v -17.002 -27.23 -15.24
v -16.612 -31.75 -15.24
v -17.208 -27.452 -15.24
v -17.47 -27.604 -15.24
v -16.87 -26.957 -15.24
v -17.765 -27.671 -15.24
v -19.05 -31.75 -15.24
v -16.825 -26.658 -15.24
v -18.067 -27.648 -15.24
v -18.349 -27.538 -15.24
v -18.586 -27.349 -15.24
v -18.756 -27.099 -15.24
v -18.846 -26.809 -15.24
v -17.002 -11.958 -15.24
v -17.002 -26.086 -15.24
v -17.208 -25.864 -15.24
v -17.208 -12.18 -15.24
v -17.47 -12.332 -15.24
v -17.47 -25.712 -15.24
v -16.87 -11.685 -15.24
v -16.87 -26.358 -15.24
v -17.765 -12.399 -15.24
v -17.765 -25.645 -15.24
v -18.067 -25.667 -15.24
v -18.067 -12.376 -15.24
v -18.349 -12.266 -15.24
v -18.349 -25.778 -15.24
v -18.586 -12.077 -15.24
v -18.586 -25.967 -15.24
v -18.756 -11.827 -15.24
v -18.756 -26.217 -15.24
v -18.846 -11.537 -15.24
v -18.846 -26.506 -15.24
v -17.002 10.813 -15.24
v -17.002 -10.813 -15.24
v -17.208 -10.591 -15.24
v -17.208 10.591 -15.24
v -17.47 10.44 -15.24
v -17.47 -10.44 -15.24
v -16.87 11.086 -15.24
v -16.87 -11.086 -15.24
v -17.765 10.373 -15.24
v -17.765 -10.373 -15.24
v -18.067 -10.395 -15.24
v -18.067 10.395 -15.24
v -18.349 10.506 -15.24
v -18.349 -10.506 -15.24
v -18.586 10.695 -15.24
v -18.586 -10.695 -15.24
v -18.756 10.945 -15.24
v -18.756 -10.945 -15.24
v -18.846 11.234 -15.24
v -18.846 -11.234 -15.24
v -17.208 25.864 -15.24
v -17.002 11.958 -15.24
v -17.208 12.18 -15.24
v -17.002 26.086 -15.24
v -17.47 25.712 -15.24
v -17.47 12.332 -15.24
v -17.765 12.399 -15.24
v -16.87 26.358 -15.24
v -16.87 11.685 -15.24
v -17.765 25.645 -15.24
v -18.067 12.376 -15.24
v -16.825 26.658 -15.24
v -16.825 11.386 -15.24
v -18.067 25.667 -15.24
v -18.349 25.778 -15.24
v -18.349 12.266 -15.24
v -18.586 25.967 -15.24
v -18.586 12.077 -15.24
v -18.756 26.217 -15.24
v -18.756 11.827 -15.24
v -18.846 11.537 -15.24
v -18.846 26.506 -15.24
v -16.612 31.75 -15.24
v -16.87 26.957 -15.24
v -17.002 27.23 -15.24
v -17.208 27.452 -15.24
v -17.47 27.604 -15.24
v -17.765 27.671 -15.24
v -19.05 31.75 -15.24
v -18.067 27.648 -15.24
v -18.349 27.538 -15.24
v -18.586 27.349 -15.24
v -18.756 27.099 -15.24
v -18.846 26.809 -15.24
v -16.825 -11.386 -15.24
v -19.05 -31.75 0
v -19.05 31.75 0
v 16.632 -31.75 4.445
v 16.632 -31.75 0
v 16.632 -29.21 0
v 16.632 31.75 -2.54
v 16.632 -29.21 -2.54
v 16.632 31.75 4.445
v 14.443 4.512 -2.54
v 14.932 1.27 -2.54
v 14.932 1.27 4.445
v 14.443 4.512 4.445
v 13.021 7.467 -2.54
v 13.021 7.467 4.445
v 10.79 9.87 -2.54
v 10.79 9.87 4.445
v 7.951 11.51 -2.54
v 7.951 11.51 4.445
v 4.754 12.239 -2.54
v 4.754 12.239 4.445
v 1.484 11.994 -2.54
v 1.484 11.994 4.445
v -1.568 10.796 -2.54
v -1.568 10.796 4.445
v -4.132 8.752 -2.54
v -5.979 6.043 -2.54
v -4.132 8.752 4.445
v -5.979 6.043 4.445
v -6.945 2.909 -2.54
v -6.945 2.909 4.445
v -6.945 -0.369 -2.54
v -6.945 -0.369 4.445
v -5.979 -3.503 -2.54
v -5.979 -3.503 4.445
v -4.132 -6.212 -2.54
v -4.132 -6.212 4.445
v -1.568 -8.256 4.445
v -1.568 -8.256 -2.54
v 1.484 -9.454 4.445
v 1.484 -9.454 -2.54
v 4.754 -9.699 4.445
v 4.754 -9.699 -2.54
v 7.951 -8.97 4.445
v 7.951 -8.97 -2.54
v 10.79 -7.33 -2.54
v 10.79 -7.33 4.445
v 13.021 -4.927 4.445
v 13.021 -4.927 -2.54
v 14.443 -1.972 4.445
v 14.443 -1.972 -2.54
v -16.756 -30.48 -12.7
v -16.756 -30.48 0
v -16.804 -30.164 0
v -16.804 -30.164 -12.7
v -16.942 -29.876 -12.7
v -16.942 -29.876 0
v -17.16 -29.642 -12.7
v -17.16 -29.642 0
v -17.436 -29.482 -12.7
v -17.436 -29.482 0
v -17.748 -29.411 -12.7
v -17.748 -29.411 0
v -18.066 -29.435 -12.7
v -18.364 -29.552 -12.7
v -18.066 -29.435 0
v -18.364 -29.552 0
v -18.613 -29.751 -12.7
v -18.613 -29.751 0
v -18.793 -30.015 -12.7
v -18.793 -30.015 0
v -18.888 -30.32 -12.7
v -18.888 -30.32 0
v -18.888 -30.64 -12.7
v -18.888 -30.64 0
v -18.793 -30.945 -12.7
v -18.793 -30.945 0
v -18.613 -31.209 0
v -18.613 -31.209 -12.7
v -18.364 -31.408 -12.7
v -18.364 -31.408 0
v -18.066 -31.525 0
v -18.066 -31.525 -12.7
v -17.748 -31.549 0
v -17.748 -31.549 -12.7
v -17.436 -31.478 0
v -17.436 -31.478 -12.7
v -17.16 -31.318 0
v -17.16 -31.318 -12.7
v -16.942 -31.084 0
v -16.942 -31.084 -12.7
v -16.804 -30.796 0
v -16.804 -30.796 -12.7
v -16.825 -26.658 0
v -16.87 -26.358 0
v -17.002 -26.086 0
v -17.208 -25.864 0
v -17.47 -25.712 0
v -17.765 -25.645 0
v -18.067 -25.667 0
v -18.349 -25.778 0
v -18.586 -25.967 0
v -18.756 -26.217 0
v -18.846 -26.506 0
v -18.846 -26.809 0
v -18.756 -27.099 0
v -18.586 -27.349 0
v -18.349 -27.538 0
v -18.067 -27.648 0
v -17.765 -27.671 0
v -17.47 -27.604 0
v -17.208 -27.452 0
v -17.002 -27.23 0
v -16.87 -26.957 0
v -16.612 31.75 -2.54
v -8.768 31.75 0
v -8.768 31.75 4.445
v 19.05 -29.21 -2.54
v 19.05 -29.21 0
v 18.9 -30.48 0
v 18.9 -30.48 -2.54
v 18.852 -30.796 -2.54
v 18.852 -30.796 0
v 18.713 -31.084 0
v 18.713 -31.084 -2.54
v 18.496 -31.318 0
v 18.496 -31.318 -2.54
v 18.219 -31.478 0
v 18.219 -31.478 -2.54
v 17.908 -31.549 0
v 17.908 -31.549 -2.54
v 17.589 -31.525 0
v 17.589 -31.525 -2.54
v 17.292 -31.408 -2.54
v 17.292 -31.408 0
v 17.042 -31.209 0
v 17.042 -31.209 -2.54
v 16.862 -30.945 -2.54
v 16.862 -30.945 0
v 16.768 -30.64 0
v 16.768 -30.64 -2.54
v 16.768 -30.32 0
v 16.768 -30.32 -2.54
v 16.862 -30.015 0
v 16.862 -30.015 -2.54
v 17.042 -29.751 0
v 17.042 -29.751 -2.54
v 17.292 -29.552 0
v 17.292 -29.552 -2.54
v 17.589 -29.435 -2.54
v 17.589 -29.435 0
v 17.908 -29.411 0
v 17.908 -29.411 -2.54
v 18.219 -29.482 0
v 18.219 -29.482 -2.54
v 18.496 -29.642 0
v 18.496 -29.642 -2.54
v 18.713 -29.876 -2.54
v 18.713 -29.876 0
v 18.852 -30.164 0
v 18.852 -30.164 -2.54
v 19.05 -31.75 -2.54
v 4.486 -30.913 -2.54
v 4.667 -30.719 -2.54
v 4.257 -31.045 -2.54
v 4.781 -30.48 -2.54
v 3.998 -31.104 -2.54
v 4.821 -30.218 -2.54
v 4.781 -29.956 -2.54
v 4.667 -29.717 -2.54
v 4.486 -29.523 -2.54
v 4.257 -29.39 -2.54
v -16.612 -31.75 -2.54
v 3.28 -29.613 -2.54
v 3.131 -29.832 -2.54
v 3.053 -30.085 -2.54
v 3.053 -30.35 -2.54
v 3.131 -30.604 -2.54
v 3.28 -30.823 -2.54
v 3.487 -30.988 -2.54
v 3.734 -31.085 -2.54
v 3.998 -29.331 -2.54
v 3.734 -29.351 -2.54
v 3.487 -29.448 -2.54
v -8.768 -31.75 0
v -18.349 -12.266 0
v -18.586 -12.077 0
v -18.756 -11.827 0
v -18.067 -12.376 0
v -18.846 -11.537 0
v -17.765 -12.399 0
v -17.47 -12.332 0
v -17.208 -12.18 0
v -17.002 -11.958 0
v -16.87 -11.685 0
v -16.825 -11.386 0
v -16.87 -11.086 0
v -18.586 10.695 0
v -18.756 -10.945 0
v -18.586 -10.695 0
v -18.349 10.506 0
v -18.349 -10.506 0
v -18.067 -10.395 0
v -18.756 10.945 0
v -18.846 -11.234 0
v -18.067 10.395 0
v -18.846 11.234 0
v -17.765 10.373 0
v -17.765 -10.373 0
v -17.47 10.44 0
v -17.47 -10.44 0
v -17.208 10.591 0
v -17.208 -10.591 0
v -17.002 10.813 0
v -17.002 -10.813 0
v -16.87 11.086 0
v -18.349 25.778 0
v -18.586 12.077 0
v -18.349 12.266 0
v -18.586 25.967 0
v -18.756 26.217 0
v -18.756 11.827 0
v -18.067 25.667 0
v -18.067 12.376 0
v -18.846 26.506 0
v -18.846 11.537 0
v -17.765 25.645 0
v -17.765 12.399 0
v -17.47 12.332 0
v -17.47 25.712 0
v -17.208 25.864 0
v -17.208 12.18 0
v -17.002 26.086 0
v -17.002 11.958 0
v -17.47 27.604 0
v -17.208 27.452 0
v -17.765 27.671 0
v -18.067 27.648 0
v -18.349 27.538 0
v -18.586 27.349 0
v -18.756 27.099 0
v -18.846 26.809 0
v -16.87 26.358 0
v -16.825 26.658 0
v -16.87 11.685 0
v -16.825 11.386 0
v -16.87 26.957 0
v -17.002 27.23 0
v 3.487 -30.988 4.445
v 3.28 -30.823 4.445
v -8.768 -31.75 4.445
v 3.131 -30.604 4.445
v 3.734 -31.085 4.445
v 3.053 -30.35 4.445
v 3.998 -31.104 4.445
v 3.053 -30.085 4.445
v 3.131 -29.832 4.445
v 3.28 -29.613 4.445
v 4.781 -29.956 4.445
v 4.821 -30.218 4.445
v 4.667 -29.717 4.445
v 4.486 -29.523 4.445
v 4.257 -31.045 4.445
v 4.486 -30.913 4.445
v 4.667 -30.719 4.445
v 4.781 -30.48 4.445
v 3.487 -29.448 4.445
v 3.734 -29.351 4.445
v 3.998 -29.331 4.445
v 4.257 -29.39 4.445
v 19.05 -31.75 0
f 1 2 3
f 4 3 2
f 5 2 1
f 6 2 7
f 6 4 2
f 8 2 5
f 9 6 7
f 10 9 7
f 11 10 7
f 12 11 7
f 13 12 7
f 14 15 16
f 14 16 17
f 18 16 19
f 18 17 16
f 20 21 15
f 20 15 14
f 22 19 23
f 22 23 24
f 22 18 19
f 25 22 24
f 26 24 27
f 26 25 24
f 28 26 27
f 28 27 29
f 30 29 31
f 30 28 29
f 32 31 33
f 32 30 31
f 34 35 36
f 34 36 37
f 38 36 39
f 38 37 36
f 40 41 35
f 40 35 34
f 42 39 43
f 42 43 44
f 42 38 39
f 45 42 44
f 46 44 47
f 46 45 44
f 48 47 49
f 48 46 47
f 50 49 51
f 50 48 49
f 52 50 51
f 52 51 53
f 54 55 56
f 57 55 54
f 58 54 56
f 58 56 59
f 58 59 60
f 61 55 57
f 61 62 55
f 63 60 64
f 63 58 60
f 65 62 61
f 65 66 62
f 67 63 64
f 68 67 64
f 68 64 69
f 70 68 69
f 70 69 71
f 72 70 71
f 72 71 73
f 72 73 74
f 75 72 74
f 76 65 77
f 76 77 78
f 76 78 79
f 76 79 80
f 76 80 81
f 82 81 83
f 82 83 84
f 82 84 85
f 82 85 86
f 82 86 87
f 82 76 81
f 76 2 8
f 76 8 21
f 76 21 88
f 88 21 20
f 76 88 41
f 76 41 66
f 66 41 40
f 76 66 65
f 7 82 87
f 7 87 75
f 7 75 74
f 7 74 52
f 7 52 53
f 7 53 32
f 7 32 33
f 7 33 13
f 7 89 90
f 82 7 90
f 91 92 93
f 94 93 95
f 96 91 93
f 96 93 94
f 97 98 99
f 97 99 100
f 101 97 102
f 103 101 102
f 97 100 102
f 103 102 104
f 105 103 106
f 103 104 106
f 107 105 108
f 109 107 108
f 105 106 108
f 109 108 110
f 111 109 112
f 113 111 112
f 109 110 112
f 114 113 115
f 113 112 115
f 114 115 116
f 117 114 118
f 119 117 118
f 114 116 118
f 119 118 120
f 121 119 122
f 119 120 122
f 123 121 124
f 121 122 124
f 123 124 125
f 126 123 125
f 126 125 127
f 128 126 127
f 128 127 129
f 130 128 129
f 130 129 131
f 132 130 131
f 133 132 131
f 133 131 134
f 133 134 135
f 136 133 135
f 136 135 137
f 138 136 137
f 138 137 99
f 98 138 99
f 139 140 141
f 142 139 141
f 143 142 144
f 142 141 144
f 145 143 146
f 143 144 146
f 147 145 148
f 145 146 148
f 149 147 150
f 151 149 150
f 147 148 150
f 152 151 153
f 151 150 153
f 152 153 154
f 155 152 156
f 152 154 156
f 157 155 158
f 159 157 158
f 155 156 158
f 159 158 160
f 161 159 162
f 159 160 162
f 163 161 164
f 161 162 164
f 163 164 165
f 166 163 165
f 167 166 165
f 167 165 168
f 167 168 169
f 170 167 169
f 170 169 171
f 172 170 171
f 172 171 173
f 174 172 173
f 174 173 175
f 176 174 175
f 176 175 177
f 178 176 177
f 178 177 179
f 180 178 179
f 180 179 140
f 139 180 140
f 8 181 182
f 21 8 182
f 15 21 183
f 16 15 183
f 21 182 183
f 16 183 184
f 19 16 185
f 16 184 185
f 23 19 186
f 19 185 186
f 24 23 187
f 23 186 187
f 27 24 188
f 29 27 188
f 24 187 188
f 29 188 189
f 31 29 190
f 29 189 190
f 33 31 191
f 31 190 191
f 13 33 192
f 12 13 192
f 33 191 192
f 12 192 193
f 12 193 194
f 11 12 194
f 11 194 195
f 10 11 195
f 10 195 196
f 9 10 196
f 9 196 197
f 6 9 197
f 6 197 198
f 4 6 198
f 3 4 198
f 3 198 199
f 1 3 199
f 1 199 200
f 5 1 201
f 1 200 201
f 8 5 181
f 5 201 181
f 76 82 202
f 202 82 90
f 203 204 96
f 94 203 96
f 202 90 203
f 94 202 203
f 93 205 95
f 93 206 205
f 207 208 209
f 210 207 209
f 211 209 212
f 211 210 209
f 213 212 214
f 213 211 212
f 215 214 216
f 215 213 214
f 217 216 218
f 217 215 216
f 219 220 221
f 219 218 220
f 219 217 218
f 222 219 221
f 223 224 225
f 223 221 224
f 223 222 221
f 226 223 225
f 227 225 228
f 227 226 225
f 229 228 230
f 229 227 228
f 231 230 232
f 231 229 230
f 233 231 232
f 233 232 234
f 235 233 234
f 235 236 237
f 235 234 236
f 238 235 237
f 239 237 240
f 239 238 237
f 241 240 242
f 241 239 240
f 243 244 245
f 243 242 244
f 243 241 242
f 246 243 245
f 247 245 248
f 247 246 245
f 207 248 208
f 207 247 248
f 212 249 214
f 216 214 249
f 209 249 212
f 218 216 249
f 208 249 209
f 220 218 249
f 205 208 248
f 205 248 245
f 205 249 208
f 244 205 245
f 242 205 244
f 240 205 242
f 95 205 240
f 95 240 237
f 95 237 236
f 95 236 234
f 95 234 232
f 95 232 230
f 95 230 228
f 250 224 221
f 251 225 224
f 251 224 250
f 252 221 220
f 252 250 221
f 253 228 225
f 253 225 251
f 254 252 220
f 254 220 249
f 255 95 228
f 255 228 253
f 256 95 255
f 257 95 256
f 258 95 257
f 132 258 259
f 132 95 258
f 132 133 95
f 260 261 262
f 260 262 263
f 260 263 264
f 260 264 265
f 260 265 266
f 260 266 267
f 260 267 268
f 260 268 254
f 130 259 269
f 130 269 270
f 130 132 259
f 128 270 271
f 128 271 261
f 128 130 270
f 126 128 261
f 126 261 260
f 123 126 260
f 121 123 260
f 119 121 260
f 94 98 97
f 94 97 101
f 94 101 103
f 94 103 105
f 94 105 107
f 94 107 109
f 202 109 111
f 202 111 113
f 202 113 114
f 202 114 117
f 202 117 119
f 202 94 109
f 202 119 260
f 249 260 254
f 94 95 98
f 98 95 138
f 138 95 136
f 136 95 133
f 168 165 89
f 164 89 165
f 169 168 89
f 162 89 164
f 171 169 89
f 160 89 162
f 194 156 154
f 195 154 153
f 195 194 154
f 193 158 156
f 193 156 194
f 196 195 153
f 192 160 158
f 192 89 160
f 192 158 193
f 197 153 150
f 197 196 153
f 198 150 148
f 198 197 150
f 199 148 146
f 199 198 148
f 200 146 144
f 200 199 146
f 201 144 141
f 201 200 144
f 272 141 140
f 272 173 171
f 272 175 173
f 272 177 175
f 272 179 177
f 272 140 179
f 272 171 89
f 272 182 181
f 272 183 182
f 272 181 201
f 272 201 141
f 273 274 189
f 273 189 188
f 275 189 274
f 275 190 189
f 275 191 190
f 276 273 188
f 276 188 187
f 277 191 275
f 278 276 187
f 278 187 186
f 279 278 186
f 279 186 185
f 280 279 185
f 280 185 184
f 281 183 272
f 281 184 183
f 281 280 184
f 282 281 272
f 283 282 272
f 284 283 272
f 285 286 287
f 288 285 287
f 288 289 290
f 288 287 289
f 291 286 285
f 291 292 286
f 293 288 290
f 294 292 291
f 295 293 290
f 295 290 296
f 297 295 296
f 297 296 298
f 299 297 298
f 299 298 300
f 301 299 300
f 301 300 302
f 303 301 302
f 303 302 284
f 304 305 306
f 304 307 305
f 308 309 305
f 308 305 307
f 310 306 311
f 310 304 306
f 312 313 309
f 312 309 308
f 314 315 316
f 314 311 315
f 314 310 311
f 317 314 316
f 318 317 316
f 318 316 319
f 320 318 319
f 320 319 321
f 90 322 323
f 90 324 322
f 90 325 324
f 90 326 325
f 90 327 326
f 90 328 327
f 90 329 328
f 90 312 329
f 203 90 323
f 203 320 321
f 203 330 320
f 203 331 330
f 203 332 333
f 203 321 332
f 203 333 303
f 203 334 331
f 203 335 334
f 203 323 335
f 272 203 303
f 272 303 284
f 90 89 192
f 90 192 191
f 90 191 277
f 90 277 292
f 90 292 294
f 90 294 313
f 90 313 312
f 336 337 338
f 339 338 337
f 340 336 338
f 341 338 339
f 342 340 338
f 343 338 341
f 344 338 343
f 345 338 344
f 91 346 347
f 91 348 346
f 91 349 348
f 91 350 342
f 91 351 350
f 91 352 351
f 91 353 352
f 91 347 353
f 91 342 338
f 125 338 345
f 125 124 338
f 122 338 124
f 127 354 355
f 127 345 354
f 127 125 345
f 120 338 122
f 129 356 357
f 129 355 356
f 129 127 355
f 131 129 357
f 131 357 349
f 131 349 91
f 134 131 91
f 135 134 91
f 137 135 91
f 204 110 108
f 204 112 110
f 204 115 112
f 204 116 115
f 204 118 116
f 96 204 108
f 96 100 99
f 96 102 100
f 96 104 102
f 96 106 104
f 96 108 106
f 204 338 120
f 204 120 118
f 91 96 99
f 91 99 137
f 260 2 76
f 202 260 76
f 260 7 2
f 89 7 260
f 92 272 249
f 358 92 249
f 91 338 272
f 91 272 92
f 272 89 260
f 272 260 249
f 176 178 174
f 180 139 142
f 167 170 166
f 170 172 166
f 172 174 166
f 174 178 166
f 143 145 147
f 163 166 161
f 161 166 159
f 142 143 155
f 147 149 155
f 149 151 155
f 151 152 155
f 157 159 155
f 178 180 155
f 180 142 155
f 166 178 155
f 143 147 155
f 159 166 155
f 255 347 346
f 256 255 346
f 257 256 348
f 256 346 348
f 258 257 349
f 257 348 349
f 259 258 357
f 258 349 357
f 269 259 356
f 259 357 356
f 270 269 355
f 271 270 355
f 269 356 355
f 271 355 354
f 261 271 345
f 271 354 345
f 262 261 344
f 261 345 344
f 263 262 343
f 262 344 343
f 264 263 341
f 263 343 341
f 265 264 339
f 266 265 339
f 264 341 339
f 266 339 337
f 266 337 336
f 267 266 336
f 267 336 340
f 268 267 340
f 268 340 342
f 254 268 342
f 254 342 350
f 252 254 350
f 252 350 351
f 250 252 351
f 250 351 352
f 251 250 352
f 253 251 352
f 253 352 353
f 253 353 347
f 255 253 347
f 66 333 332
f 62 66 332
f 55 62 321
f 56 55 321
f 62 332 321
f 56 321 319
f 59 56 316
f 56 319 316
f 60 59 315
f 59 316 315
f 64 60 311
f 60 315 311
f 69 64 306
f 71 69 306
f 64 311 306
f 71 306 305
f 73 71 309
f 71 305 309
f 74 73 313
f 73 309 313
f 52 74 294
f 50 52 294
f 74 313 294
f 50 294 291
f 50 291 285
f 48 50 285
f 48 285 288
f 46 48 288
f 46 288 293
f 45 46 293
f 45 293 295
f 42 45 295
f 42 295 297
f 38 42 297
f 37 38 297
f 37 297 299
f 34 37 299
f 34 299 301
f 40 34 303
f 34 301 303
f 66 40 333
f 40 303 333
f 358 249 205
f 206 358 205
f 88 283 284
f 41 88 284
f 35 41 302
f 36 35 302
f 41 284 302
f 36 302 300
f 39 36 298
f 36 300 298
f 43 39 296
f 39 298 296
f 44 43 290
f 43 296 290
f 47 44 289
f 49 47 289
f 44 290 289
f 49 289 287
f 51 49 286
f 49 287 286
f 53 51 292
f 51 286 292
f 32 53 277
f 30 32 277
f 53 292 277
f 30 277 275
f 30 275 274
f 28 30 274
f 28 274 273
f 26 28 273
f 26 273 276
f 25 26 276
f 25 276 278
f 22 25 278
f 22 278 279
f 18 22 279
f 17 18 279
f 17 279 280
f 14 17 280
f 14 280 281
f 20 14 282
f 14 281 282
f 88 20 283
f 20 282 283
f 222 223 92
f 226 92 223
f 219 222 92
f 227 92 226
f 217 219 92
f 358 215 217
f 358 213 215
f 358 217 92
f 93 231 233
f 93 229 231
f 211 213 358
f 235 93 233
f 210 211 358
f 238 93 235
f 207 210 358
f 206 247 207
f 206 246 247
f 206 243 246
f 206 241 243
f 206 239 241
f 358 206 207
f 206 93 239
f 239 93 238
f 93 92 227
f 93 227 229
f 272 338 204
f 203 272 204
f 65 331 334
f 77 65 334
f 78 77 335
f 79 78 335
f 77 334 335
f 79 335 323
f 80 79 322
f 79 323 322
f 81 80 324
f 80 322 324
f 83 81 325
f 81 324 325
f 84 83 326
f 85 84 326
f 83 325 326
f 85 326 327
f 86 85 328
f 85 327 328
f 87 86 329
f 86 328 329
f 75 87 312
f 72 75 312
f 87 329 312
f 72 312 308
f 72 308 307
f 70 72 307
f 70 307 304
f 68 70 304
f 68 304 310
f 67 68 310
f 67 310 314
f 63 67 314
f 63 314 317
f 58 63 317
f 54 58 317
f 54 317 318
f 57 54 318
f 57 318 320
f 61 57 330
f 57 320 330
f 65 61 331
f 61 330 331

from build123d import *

# Parameters (mm, degrees)
SKETCH1_W             = 2.437632846
SKETCH1_H             = 63.5
SKETCH1_R             = 1.016
BOSS_EXTRUDE1_DEPTH   = 15.24
BOSS_EXTRUDE1_2_DEPTH = 15.24
SKETCH2_W             = 33.244360662
SKETCH2_H             = 63.5
BOSS_EXTRUDE2_DEPTH   = 2.54
SKETCH3_W             = 38.1
SKETCH3_H             = 12.7
BOSS_EXTRUDE3_DEPTH   = 2.54
SKETCH5_R             = 1.071714946
CUT_EXTRUDE2_DEPTH    = 41.040262237
SKETCH6_R             = 1.016
CUT_EXTRUDE3_DEPTH    = 41.040262237
SKETCH7_W             = 38.1
SKETCH7_H             = 2.54
SKETCH7_R             = 1.071714946
BOSS_EXTRUDE5_DEPTH   = 2.54
CUT_EXTRUDE4_DEPTH    = 41.040262237
BOSS_EXTRUDE6_START   = 4.445
SKETCH9_W             = 25.4
SKETCH9_H             = 63.5
SKETCH9_R             = 11.0000034
BOSS_EXTRUDE6_DEPTH   = 4.445
SKETCH10_W            = 35.662367154
SKETCH10_H            = 2.54
CUT_EXTRUDE5_DEPTH    = 12.7
SKETCH11_R            = 0.889
CUT_EXTRUDE7_DEPTH    = 12.7


with BuildPart() as part:
    # Sketch1 → Boss-Extrude1 (new body)
    with BuildSketch(Plane.XY):
        with Locations((-17.831183577, 0)):
            Rectangle(SKETCH1_W, SKETCH1_H)
        with Locations((-17.840996754, -26.657844962)):
            Circle(SKETCH1_R, mode=Mode.SUBTRACT)
        with Locations((-17.840996754, -11.385809707)):
            Circle(SKETCH1_R, mode=Mode.SUBTRACT)
        with Locations((-17.840996754, 11.385809707)):
            Circle(SKETCH1_R, mode=Mode.SUBTRACT)
        with Locations((-17.840996754, 26.657844962)):
            Circle(SKETCH1_R, mode=Mode.SUBTRACT)
    extrude(amount=-BOSS_EXTRUDE1_DEPTH)

    # Sketch2 → Boss-Extrude2 (add)
    with BuildSketch(Plane.XY):
        with Locations((0.009813177, 0)):
            Rectangle(SKETCH2_W, SKETCH2_H)
    extrude(amount=-BOSS_EXTRUDE2_DEPTH)

    # Sketch3 → Boss-Extrude3 (add)
    with BuildSketch(Plane.XZ.offset(31.75)):
        with Locations((0, -6.35)):
            Rectangle(SKETCH3_W, SKETCH3_H)
    extrude(amount=-BOSS_EXTRUDE3_DEPTH)

    # Sketch5 → Cut-Extrude2 (cut, through all)
    with BuildSketch(Plane.XY):
        with Locations((-17.827792249, -30.48)):
            Circle(SKETCH5_R)
        with Locations((17.827792249, -30.48)):
            Circle(SKETCH5_R)
    extrude(amount=-CUT_EXTRUDE2_DEPTH, mode=Mode.SUBTRACT)

    # Sketch7 → Boss-Extrude5 (add)
    with BuildSketch(Plane(origin=(0, 0, -12.7), x_dir=(-1, 0, 0), z_dir=(0, 0, -1))):
        with Locations((0, -30.48)):
            Rectangle(SKETCH7_W, SKETCH7_H)
        with Locations(Location((-17.827792249, -30.48, 0), (0, 0, 180))):
            Circle(SKETCH7_R, mode=Mode.SUBTRACT)
    extrude(amount=BOSS_EXTRUDE5_DEPTH)

    # Sketch8 → Cut-Extrude4 (cut, through all)
    with BuildSketch(Plane.XY):
        with BuildLine():
            ThreePointArc((-7.068009892, 1.27), (3.931993508, -9.7300034), (14.931996908, 1.27))
            Line((14.931996908, 1.27), (-7.068009892, 1.27))
        make_face()
        with BuildLine():
            Line((-7.068009892, 1.27), (14.931996908, 1.27))
            ThreePointArc((14.931996908, 1.27), (3.931993508, 12.2700034), (-7.068009892, 1.27))
        make_face()
    extrude(amount=-CUT_EXTRUDE4_DEPTH, mode=Mode.SUBTRACT)

    # Sketch9 → Boss-Extrude6 (add)
    with BuildSketch(Plane.XY.offset(BOSS_EXTRUDE6_START)):
        with Locations((3.931993508, 0)):
            Rectangle(SKETCH9_W, SKETCH9_H)
        with Locations((3.931993508, 1.27)):
            Circle(SKETCH9_R, mode=Mode.SUBTRACT)
    extrude(amount=-BOSS_EXTRUDE6_DEPTH)

    # Sketch10 → Cut-Extrude5 (cut)
    with BuildSketch(Plane(origin=(0, 0, -15.24), x_dir=(-1, 0, 0), z_dir=(0, 0, -1))):
        with Locations((-1.218816423, -30.48)):
            Rectangle(SKETCH10_W, SKETCH10_H)
    extrude(amount=-CUT_EXTRUDE5_DEPTH, mode=Mode.SUBTRACT)

    # Sketch11 → Cut-Extrude7 (cut)
    with BuildSketch(Plane.XY.offset(4.445)):
        with Locations((3.931993508, -30.217851705)):
            Circle(SKETCH11_R)
    extrude(amount=-CUT_EXTRUDE7_DEPTH, mode=Mode.SUBTRACT)


with BuildPart() as body_2:
    # Sketch1 → Boss-Extrude1 2 (new body)
    with BuildSketch(Plane.XY):
        with Locations((17.840996754, -26.657844962)):
            Circle(SKETCH1_R)
    extrude(amount=-BOSS_EXTRUDE1_2_DEPTH)

    # Sketch6 → Cut-Extrude3 (cut, through all)
    with BuildSketch(Plane.XY):
        with Locations((17.840996754, -26.657844962)):
            Circle(SKETCH6_R)
    extrude(amount=-CUT_EXTRUDE3_DEPTH, mode=Mode.SUBTRACT)


solid = part.part
